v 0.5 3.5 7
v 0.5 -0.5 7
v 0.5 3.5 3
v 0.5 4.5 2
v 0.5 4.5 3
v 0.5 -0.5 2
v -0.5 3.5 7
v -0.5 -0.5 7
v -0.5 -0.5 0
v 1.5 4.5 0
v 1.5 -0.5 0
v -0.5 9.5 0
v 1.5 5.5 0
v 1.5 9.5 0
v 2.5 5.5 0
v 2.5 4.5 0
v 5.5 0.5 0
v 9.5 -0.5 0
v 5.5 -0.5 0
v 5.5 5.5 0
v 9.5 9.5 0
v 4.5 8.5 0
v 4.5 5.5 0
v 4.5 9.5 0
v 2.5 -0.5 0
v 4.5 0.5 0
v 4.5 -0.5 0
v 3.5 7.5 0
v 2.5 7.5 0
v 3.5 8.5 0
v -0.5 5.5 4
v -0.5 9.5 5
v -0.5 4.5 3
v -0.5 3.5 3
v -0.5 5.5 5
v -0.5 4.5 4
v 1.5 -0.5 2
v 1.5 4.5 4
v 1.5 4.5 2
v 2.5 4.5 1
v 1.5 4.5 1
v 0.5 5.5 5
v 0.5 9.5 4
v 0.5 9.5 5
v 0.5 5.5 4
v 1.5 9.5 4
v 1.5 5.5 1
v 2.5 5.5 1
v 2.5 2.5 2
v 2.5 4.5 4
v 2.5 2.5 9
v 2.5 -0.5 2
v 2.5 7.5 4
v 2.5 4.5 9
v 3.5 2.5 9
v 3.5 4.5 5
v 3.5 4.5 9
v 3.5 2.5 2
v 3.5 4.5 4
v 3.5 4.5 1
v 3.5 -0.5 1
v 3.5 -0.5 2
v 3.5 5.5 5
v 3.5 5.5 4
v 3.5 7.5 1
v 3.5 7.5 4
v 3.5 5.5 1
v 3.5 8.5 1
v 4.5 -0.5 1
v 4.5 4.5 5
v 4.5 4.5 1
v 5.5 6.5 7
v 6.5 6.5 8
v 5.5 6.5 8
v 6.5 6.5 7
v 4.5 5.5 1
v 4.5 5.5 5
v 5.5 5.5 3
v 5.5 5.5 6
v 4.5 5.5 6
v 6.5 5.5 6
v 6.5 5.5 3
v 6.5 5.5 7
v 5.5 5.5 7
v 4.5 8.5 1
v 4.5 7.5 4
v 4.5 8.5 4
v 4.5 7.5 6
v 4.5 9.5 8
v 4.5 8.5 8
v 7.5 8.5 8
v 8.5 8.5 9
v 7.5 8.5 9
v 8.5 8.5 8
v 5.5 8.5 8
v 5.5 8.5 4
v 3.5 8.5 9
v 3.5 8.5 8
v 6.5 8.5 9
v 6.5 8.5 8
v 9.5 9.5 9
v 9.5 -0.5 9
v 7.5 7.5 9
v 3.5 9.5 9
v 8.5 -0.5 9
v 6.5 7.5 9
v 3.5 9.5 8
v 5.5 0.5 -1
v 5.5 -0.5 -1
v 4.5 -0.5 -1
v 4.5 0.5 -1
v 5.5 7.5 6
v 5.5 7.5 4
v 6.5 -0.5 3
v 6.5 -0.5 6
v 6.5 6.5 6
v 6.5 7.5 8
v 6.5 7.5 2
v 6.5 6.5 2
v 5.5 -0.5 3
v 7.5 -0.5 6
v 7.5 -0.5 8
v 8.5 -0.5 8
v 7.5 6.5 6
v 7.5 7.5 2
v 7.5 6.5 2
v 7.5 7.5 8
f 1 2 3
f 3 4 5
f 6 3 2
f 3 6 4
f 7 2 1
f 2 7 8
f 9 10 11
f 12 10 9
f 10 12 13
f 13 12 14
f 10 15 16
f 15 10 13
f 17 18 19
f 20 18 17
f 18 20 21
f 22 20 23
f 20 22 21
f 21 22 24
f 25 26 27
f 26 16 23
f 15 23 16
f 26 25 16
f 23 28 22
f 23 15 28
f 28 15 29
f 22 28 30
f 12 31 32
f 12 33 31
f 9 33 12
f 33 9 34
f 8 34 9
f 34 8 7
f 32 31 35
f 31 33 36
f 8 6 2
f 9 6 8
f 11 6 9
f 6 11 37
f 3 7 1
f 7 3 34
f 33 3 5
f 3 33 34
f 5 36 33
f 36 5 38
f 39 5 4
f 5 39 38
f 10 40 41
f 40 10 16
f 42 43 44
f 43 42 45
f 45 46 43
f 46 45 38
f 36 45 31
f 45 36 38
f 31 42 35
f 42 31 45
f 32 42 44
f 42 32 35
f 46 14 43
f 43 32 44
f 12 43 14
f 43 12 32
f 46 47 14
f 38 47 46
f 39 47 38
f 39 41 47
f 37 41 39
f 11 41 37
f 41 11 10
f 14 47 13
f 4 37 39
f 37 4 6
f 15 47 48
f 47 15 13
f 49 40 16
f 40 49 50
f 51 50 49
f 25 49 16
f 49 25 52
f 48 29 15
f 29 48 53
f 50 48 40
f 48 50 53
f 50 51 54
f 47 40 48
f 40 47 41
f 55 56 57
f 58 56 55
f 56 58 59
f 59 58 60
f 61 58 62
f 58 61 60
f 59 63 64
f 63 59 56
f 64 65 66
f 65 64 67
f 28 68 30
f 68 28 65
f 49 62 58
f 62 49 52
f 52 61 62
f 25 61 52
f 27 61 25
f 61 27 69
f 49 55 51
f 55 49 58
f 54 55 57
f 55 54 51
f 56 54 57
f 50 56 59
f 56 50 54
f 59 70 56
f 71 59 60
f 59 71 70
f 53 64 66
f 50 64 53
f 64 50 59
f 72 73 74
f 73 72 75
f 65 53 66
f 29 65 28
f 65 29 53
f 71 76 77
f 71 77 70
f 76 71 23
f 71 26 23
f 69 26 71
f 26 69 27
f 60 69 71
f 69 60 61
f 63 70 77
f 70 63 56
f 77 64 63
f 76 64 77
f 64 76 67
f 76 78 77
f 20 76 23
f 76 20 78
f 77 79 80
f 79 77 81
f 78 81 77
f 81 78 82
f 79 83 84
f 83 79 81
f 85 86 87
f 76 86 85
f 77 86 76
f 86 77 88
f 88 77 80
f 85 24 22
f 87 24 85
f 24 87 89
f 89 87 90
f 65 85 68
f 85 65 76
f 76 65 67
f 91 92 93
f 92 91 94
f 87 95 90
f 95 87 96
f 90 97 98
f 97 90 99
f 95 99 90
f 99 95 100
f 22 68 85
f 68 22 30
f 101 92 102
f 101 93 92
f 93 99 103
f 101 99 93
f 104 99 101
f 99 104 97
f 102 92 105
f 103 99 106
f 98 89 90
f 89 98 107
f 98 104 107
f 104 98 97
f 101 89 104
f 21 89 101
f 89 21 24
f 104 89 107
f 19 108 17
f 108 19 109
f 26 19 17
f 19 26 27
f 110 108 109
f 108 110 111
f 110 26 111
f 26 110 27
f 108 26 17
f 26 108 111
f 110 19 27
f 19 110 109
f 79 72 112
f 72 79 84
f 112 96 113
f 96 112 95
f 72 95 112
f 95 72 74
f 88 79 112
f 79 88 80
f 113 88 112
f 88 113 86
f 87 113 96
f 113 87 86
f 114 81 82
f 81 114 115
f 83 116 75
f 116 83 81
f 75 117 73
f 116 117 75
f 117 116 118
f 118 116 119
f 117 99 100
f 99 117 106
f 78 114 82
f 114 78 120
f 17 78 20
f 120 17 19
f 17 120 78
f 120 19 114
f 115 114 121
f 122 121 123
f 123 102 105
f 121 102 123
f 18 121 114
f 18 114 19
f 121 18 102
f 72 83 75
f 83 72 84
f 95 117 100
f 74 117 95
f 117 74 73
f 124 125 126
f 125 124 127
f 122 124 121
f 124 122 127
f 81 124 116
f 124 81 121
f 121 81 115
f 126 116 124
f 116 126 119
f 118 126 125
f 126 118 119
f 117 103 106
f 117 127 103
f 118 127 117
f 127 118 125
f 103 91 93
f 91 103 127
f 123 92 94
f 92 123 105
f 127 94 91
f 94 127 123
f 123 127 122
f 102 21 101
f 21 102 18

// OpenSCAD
union() {
    translate([0, 0, 3.5]) cube([1, 1, 7], center=true);
    translate([0, 1, 3.5]) cube([1, 1, 7], center=true);
    translate([0, 2, 3.5]) cube([1, 1, 7], center=true);
    translate([0, 3, 3.5]) cube([1, 1, 7], center=true);
    translate([0, 4, 1.5]) cube([1, 1, 3], center=true);
    translate([0, 5, 2.0]) cube([1, 1, 4], center=true);
    translate([0, 6, 2.5]) cube([1, 1, 5], center=true);
    translate([0, 7, 2.5]) cube([1, 1, 5], center=true);
    translate([0, 8, 2.5]) cube([1, 1, 5], center=true);
    translate([0, 9, 2.5]) cube([1, 1, 5], center=true);
    translate([1, 0, 1.0]) cube([1, 1, 2], center=true);
    translate([1, 1, 1.0]) cube([1, 1, 2], center=true);
    translate([1, 2, 1.0]) cube([1, 1, 2], center=true);
    translate([1, 3, 1.0]) cube([1, 1, 2], center=true);
    translate([1, 4, 1.0]) cube([1, 1, 2], center=true);
    translate([1, 5, 2.0]) cube([1, 1, 4], center=true);
    translate([1, 6, 2.0]) cube([1, 1, 4], center=true);
    translate([1, 7, 2.0]) cube([1, 1, 4], center=true);
    translate([1, 8, 2.0]) cube([1, 1, 4], center=true);
    translate([1, 9, 2.0]) cube([1, 1, 4], center=true);
    translate([2, 5, 0.5]) cube([1, 1, 1], center=true);
    translate([3, 0, 1.0]) cube([1, 1, 2], center=true);
    translate([3, 1, 1.0]) cube([1, 1, 2], center=true);
    translate([3, 2, 1.0]) cube([1, 1, 2], center=true);
    translate([3, 3, 4.5]) cube([1, 1, 9], center=true);
    translate([3, 4, 4.5]) cube([1, 1, 9], center=true);
    translate([3, 5, 2.0]) cube([1, 1, 4], center=true);
    translate([3, 6, 2.0]) cube([1, 1, 4], center=true);
    translate([3, 7, 2.0]) cube([1, 1, 4], center=true);
    translate([4, 0, 0.5]) cube([1, 1, 1], center=true);
    translate([4, 1, 0.5]) cube([1, 1, 1], center=true);
    translate([4, 2, 0.5]) cube([1, 1, 1], center=true);
    translate([4, 3, 0.5]) cube([1, 1, 1], center=true);
    translate([4, 4, 0.5]) cube([1, 1, 1], center=true);
    translate([4, 5, 2.5]) cube([1, 1, 5], center=true);
    translate([4, 6, 0.5]) cube([1, 1, 1], center=true);
    translate([4, 7, 0.5]) cube([1, 1, 1], center=true);
    translate([4, 8, 0.5]) cube([1, 1, 1], center=true);
    translate([4, 9, 8.5]) color([0, 0, 1]) cube([1, 1, 1], center=true);
    translate([5, 0, -0.5]) color([1, 0, 0]) cube([1, 1, 1], center=true);
    translate([5, 6, 3.0]) cube([1, 1, 6], center=true);
    translate([5, 7, 3.0]) cube([1, 1, 6], center=true);
    translate([5, 8, 2.0]) cube([1, 1, 4], center=true);
    translate([5, 9, 4.5]) cube([1, 1, 9], center=true);
    translate([6, 0, 1.5]) cube([1, 1, 3], center=true);
    translate([6, 1, 1.5]) cube([1, 1, 3], center=true);
    translate([6, 2, 1.5]) cube([1, 1, 3], center=true);
    translate([6, 3, 1.5]) cube([1, 1, 3], center=true);
    translate([6, 4, 1.5]) cube([1, 1, 3], center=true);
    translate([6, 5, 1.5]) cube([1, 1, 3], center=true);
    translate([6, 6, 3.5]) cube([1, 1, 7], center=true);
    translate([6, 7, 4.0]) cube([1, 1, 8], center=true);
    translate([6, 8, 4.0]) cube([1, 1, 8], center=true);
    translate([6, 9, 4.5]) cube([1, 1, 9], center=true);
    translate([7, 0, 3.0]) cube([1, 1, 6], center=true);
    translate([7, 1, 3.0]) cube([1, 1, 6], center=true);
    translate([7, 2, 3.0]) cube([1, 1, 6], center=true);
    translate([7, 3, 3.0]) cube([1, 1, 6], center=true);
    translate([7, 4, 3.0]) cube([1, 1, 6], center=true);
    translate([7, 5, 3.0]) cube([1, 1, 6], center=true);
    translate([7, 6, 3.0]) cube([1, 1, 6], center=true);
    translate([7, 7, 1.0]) cube([1, 1, 2], center=true);
    translate([7, 8, 4.5]) cube([1, 1, 9], center=true);
    translate([7, 9, 4.5]) cube([1, 1, 9], center=true);
    translate([8, 0, 4.0]) cube([1, 1, 8], center=true);
    translate([8, 1, 4.0]) cube([1, 1, 8], center=true);
    translate([8, 2, 4.0]) cube([1, 1, 8], center=true);
    translate([8, 3, 4.0]) cube([1, 1, 8], center=true);
    translate([8, 4, 4.0]) cube([1, 1, 8], center=true);
    translate([8, 5, 4.0]) cube([1, 1, 8], center=true);
    translate([8, 6, 4.0]) cube([1, 1, 8], center=true);
    translate([8, 7, 4.0]) cube([1, 1, 8], center=true);
    translate([8, 8, 4.0]) cube([1, 1, 8], center=true);
    translate([8, 9, 4.5]) cube([1, 1, 9], center=true);
    translate([9, 0, 4.5]) cube([1, 1, 9], center=true);
    translate([9, 1, 4.5]) cube([1, 1, 9], center=true);
    translate([9, 2, 4.5]) cube([1, 1, 9], center=true);
    translate([9, 3, 4.5]) cube([1, 1, 9], center=true);
    translate([9, 4, 4.5]) cube([1, 1, 9], center=true);
    translate([9, 5, 4.5]) cube([1, 1, 9], center=true);
    translate([9, 6, 4.5]) cube([1, 1, 9], center=true);
    translate([9, 7, 4.5]) cube([1, 1, 9], center=true);
    translate([9, 8, 4.5]) cube([1, 1, 9], center=true);
    translate([9, 9, 4.5]) cube([1, 1, 9], center=true);
}
